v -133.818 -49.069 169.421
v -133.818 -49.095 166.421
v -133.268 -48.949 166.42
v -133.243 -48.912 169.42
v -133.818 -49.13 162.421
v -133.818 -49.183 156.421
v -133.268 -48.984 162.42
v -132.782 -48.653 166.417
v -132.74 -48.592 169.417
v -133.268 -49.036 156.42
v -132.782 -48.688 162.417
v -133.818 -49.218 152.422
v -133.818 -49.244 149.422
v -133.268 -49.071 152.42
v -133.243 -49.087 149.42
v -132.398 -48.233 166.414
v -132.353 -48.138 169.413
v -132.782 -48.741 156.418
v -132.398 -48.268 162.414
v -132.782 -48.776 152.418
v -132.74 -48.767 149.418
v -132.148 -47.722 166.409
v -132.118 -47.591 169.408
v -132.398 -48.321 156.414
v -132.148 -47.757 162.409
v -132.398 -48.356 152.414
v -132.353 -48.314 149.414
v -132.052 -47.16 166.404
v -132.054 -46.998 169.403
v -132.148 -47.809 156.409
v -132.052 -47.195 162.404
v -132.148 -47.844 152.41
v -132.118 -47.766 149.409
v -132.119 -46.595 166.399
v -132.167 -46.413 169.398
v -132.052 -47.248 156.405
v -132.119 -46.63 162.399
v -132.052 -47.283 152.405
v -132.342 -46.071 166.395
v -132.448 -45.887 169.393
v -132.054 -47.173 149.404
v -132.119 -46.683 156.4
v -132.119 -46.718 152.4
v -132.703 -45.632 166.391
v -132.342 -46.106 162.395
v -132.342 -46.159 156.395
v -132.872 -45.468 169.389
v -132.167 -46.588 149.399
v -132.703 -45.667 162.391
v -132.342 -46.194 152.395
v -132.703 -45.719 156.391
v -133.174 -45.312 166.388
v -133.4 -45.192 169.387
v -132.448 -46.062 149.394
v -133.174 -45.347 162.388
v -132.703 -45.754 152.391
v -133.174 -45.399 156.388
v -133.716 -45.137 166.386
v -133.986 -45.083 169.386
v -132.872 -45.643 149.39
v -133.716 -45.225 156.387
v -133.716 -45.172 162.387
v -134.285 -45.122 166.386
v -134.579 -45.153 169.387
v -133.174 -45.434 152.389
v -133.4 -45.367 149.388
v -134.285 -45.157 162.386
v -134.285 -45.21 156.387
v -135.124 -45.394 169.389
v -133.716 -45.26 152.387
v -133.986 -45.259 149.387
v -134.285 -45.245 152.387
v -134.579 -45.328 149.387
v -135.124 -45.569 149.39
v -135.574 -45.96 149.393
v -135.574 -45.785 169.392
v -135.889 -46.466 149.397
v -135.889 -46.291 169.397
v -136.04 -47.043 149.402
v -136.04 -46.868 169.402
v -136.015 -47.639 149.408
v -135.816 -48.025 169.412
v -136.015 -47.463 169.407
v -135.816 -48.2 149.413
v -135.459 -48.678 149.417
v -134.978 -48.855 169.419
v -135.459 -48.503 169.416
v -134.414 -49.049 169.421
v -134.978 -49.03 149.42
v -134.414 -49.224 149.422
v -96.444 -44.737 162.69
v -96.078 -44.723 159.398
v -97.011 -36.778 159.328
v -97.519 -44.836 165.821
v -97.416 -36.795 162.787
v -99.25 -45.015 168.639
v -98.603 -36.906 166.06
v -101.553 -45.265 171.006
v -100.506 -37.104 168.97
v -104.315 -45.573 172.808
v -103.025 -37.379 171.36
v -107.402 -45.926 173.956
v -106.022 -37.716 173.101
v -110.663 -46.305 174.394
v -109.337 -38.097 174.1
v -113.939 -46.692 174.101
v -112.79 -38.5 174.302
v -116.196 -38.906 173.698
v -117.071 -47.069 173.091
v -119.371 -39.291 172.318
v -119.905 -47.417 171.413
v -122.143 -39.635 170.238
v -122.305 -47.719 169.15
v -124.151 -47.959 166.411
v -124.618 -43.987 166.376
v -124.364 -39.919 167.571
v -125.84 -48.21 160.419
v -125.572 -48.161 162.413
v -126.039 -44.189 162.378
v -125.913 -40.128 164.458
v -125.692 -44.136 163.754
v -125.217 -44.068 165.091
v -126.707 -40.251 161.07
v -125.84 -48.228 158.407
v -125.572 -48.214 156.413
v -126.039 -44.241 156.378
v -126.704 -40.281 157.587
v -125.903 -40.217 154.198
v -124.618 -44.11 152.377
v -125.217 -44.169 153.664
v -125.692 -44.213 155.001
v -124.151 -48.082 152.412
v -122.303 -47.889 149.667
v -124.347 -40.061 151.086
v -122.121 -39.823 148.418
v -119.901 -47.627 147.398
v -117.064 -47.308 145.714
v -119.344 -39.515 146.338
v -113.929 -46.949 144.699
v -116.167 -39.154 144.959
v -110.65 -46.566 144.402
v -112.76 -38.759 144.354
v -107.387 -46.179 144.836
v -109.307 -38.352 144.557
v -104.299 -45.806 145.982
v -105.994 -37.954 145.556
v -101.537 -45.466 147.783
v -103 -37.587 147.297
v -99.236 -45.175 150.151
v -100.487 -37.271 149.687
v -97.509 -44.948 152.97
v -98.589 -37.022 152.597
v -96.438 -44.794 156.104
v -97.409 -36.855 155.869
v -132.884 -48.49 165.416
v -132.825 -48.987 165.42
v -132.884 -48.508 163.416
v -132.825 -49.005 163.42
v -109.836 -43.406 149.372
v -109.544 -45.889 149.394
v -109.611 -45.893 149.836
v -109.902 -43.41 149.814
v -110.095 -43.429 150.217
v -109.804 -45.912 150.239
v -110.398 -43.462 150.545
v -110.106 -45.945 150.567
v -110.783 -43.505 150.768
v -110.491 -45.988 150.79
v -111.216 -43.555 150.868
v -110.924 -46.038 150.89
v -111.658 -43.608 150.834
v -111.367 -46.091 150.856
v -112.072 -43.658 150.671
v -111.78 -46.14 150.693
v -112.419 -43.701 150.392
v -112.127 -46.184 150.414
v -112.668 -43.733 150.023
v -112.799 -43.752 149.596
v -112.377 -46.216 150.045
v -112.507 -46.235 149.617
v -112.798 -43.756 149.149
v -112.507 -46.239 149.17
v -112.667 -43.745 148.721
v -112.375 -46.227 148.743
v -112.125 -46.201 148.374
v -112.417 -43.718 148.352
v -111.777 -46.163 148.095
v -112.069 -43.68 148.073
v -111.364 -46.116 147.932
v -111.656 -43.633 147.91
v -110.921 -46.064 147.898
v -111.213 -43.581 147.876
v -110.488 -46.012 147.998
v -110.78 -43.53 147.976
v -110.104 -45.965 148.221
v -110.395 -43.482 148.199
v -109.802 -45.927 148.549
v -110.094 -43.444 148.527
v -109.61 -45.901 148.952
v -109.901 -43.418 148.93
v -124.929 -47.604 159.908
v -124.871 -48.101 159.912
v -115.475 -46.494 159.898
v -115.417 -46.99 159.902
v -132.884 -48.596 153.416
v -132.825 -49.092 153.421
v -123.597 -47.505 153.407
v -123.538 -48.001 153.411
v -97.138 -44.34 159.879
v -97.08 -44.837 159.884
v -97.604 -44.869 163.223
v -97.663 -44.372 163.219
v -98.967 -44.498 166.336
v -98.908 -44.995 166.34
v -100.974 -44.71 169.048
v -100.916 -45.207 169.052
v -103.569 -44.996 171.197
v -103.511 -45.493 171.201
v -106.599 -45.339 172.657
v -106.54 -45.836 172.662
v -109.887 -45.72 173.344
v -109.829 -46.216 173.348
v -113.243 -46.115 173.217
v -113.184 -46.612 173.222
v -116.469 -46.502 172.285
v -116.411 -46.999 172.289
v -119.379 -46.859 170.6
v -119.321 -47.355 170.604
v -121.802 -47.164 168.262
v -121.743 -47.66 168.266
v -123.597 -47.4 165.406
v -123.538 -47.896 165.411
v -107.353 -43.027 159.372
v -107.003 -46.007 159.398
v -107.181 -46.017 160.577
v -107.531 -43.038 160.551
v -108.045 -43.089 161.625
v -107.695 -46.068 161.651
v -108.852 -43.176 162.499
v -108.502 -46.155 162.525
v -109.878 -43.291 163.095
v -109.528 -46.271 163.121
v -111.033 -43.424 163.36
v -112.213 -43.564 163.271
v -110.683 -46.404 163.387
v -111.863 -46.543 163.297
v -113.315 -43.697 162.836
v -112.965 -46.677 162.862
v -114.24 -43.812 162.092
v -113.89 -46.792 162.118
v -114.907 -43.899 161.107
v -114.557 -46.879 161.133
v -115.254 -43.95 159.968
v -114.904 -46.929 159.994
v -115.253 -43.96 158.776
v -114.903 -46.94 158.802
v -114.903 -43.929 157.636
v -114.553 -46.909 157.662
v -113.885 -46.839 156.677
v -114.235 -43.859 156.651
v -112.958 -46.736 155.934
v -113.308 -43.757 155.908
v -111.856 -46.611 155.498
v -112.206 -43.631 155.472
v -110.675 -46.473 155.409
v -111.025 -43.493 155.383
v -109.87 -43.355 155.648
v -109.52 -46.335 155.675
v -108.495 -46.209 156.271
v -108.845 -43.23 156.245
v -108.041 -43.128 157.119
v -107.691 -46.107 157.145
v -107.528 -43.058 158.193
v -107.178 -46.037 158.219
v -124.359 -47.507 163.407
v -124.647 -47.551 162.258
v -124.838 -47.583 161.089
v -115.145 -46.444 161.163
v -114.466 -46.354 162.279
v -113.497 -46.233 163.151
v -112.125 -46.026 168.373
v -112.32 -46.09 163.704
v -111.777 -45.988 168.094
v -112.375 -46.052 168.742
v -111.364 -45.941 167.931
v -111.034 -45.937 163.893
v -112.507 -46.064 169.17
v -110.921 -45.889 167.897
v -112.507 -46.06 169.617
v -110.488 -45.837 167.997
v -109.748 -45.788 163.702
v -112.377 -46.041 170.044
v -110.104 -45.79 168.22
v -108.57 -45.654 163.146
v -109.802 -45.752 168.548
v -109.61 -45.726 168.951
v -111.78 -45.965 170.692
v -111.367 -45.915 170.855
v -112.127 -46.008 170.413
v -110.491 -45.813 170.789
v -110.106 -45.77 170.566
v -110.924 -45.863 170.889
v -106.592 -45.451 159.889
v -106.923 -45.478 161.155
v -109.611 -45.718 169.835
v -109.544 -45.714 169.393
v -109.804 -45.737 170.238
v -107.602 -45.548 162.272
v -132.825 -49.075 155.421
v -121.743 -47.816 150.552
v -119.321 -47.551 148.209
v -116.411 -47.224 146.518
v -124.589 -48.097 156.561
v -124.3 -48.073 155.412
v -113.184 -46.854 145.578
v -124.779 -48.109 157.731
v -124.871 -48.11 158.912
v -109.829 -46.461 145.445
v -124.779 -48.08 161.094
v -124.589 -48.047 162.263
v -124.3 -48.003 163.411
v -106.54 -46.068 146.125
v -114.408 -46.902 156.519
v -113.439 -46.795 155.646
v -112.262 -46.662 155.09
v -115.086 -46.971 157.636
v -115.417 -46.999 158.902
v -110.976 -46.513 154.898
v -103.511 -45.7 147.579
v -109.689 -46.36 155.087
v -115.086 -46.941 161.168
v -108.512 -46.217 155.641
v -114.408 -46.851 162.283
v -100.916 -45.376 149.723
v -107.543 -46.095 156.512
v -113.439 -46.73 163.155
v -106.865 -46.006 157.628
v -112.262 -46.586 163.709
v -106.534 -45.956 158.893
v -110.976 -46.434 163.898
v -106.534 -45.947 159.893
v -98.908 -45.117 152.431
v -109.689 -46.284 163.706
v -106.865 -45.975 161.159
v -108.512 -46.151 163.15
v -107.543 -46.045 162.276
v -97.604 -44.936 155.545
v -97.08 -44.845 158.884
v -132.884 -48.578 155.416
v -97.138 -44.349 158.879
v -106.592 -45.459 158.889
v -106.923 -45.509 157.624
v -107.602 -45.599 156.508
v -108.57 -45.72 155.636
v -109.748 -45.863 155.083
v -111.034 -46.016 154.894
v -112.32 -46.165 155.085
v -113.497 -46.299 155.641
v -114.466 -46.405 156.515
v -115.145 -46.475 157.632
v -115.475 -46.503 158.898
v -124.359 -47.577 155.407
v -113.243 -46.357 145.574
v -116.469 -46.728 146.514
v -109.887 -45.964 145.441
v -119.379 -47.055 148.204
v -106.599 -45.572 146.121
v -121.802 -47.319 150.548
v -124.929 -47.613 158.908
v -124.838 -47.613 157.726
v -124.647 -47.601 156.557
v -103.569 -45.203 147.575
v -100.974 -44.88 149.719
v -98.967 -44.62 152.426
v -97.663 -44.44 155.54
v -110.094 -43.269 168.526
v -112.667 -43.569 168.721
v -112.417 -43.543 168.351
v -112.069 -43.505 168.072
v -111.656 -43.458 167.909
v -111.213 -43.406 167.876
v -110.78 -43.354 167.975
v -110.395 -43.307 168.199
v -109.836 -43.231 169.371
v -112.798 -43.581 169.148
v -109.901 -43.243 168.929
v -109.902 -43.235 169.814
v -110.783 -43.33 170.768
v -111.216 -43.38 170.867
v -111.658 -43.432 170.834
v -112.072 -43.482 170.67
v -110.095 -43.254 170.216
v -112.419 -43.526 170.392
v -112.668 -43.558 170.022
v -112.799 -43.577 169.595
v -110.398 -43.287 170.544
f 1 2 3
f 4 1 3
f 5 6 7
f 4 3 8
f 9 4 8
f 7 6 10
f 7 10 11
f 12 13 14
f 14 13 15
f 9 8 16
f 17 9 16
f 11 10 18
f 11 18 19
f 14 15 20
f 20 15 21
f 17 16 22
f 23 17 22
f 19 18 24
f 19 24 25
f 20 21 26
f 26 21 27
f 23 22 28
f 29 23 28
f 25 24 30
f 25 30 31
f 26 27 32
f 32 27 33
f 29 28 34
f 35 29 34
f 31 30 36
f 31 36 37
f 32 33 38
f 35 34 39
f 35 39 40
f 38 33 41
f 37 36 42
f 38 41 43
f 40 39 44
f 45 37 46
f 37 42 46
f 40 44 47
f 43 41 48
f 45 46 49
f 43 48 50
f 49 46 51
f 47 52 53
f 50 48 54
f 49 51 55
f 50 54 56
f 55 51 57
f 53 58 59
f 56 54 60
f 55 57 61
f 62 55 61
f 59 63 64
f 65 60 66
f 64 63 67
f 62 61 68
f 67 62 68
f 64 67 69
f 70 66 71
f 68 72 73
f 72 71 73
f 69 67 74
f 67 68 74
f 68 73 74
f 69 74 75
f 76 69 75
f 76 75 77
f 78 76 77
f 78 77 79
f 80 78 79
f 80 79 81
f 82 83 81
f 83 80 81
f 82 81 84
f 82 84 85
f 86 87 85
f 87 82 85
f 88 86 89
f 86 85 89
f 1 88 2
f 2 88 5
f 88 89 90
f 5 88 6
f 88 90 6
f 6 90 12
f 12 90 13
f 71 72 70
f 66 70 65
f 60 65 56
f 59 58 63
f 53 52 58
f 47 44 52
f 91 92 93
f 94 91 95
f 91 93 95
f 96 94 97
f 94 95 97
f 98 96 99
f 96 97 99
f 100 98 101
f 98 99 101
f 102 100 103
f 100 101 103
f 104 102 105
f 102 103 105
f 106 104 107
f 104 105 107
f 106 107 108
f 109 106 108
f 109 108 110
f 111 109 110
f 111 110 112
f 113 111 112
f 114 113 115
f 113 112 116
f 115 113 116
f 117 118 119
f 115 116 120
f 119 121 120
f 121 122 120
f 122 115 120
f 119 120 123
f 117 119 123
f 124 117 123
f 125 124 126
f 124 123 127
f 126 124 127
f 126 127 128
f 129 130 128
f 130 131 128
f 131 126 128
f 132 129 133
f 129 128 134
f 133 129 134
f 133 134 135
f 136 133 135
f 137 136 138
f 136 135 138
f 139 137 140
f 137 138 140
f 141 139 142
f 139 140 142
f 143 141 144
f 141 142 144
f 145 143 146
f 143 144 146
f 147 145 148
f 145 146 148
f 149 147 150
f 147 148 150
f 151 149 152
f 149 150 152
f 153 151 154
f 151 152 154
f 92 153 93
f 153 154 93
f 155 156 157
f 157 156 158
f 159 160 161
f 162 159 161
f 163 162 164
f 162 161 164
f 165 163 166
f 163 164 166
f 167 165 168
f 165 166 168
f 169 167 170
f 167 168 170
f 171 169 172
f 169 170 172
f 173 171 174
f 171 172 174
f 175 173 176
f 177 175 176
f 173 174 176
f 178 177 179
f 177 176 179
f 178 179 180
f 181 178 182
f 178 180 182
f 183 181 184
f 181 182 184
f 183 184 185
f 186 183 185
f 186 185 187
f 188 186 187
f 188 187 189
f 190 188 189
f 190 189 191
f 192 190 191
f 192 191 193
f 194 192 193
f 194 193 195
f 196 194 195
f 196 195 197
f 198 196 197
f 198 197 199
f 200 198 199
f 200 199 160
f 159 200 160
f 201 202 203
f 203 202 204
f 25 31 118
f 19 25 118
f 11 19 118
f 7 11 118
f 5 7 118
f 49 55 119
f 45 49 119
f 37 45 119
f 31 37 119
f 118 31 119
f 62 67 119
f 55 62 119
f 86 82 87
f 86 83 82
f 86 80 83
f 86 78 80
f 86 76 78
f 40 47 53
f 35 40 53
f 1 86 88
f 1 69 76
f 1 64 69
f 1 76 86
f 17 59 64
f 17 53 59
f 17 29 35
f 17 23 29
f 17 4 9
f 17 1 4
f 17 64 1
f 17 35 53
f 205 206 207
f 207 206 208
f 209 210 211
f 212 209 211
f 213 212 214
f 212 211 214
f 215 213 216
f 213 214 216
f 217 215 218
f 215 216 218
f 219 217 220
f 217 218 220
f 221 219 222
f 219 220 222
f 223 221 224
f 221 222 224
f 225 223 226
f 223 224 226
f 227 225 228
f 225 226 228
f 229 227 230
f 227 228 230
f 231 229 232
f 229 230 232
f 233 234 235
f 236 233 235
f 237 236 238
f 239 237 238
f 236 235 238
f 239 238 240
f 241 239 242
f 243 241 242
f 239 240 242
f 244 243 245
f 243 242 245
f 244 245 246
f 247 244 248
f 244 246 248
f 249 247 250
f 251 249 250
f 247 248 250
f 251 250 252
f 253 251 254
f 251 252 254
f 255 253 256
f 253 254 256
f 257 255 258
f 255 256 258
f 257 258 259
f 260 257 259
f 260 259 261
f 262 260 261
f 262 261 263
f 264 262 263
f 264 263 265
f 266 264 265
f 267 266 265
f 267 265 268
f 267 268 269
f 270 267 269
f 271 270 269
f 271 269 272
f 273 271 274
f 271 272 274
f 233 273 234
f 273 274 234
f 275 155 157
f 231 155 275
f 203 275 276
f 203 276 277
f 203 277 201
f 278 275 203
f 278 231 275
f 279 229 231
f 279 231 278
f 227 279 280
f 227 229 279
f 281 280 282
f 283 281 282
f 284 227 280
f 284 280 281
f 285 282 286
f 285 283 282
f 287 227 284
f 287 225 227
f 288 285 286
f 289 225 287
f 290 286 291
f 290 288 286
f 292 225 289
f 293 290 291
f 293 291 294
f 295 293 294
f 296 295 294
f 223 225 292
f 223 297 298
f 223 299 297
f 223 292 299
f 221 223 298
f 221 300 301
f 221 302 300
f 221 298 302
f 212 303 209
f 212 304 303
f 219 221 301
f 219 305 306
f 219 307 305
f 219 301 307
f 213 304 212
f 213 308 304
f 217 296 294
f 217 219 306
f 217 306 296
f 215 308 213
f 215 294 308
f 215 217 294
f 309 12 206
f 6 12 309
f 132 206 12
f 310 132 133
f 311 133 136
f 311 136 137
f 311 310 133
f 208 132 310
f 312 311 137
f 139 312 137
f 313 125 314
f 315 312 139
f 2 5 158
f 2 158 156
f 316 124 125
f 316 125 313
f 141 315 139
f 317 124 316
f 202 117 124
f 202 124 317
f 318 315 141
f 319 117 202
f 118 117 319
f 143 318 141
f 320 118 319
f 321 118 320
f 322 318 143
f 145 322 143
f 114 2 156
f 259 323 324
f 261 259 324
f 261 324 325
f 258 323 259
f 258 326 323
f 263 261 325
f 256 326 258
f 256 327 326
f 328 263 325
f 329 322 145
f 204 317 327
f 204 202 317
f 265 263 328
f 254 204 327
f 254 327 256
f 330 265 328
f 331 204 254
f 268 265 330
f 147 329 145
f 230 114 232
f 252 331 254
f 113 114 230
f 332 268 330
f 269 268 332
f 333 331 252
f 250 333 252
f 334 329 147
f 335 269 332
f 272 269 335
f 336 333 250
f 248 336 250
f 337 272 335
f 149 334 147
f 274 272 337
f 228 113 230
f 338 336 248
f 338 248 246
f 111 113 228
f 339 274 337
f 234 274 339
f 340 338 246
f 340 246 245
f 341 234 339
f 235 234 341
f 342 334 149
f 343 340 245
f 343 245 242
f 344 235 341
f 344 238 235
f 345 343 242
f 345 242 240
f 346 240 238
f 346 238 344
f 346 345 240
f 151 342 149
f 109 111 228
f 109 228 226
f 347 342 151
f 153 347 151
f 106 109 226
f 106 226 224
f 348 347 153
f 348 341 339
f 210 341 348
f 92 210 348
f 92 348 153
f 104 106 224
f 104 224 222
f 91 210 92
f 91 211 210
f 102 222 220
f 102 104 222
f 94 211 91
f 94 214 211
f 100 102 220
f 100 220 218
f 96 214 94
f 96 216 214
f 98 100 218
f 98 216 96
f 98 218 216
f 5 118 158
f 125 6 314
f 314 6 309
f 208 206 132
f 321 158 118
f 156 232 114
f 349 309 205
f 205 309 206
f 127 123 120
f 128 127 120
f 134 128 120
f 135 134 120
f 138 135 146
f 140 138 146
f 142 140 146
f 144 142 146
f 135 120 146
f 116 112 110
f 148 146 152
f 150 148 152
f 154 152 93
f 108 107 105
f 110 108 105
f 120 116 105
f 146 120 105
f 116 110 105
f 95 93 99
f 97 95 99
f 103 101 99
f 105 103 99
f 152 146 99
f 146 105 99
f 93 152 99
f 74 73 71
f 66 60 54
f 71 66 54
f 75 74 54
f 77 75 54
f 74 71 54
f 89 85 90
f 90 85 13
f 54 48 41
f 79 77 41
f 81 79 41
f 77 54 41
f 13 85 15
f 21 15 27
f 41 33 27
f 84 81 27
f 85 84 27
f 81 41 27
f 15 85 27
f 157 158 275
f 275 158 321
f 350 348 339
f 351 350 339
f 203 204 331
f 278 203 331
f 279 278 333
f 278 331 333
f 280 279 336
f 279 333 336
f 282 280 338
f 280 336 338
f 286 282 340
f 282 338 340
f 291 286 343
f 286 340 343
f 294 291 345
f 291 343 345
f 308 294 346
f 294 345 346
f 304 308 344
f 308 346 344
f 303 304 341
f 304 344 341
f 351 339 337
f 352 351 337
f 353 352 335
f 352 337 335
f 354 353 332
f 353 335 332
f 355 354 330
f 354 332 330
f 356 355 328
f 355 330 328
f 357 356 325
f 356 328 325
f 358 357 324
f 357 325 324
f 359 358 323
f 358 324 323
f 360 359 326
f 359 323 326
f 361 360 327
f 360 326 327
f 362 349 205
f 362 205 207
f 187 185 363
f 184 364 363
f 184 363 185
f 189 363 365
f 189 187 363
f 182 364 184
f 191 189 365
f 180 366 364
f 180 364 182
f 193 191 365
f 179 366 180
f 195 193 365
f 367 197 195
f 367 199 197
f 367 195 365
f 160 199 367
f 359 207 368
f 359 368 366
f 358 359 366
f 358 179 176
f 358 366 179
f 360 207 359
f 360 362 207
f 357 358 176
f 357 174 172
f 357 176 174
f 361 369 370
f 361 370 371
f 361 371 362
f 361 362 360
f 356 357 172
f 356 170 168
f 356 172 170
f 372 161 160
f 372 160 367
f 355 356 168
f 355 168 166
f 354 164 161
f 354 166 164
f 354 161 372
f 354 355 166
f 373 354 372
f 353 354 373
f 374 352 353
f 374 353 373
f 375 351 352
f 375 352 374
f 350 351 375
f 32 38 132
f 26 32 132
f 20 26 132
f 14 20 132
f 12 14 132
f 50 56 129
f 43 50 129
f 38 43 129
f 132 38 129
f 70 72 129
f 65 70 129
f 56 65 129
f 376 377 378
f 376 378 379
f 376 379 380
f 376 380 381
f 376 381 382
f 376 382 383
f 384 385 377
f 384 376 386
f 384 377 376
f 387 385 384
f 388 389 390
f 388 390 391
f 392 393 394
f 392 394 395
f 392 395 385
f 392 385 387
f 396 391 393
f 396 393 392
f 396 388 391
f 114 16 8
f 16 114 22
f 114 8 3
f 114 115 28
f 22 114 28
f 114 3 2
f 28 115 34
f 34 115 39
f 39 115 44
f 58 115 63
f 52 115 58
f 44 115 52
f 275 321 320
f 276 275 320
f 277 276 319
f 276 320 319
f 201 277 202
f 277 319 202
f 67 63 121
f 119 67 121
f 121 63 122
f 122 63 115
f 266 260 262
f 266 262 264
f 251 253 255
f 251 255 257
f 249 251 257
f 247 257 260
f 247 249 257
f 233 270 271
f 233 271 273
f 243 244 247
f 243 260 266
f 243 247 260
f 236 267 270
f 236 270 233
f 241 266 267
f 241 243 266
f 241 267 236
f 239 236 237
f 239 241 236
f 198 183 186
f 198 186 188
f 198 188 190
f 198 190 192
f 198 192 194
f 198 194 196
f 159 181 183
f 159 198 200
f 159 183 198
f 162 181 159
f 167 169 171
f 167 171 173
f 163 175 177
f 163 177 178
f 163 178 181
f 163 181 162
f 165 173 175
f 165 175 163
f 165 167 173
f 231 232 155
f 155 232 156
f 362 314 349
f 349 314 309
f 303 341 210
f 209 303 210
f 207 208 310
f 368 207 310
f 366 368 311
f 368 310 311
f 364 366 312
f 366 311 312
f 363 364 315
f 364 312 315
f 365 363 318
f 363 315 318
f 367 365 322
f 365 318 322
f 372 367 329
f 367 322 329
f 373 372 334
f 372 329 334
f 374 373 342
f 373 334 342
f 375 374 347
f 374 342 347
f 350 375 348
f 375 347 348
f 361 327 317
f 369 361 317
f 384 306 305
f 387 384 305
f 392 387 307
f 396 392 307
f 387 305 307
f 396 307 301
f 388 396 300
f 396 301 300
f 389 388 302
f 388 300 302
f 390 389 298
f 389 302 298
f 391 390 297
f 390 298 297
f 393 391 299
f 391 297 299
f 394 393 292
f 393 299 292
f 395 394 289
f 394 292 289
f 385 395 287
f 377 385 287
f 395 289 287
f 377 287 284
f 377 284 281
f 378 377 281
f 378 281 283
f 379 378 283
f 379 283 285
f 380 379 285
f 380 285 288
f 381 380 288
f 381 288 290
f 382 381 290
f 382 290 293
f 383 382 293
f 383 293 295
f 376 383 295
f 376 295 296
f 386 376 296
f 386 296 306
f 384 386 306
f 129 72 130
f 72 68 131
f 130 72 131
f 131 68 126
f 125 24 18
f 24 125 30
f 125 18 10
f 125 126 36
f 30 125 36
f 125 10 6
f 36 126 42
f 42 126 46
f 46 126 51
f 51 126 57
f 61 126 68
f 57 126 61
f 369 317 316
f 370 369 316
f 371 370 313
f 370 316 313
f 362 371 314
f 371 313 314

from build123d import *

# Parameters (mm, degrees)
CROQUIS1_R                   = 15.000000000000002
SALIENTE_EXTRUIR1_DEPTH      = 8
CROQUIS2_R                   = 4.000000000000007
CROQUIS2_R_2                 = 1.4999999999999973
CORTAR_EXTRUIR1_DEPTH        = 3
SALIENTE_EXTRUIR2_START      = -4
SALIENTE_EXTRUIR2_DEPTH      = 4
SALIENTE_EXTRUIR3_DEPTH      = 10
SALIENTE_EXTRUIR3_DEPTH_BACK = 10
CROQUIS4_R                   = 1.999999999999995
CORTAR_EXTRUIR2_DEPTH        = 26.000000000000004
CROQUIS6_R                   = 1.499999999999999
CORTAR_EXTRUIR3_DEPTH        = 0.5


with BuildPart() as part:
    # Croquis1 → Saliente-Extruir1 (new body)
    with BuildSketch(Plane(origin=(3.102503887066035, -26.412068884743757, 0.2313913751144545), x_dir=(0.9931720445250996, 0.11665438489091776, -0.0010219880408017562), z_dir=(0.11665886153153528, -0.9931339327669669, 0.008700667387268338))):
        with Locations(Location((-115.80198834358447, 158.9846336736222, 0), (0, 0, 0.058557828))):
            Circle(CROQUIS1_R)
    extrude(amount=SALIENTE_EXTRUIR1_DEPTH)

    # Croquis2 → Cortar-Extruir1 (cut)
    with BuildSketch(Plane(origin=(4.03577477931832, -34.35714034687951, 0.3009967142126015), x_dir=(0.9931720445250996, 0.11665438489091778, -0.0010219880408017569), z_dir=(0.1166588615315353, -0.9931339327669669, 0.00870066738726834))):
        with Locations(Location((-115.8019883435845, 158.9846336736222, 0), (0, 0, 0.058557828))):
            Circle(CROQUIS2_R)
        with Locations(Location((-115.8019883435845, 168.9846336736222, 0), (0, 0, 0.058557828))):
            Circle(CROQUIS2_R_2)
        with Locations(Location((-115.8019883435845, 148.9846336736222, 0), (0, 0, 0.058557828))):
            Circle(CROQUIS2_R_2)
    extrude(amount=-CORTAR_EXTRUIR1_DEPTH, mode=Mode.SUBTRACT)

    # Croquis3 → Saliente-Extruir2 (add)
    with BuildSketch(Plane(origin=(4.03577477931832, -34.35714034687951, 0.3009967142126015), x_dir=(0.9931720445250996, 0.11665438489091778, -0.0010219880408017569), z_dir=(0.1166588615315353, -0.9931339327669669, 0.00870066738726834)).offset(SALIENTE_EXTRUIR2_START)):
        with BuildLine():
            Line((-140.80198834358453, 161.9846336736222), (-130.49892680028356, 161.9846336736222))
            ThreePointArc((-130.49892680028356, 161.98463367362223), (-129.9260267482204, 164.03552855912218), (-129.06848750500595, 165.98463367362243))
            Line((-129.0684875050059, 165.9846336736222), (-140.80198834358453, 165.9846336736222))
            Line((-140.80198834358453, 165.9846336736222), (-140.80198834358453, 161.9846336736222))
        make_face()
        with BuildLine():
            ThreePointArc((-129.06848750500598, 151.98463367362197), (-129.9260267482204, 153.9337387881222), (-130.49892680028356, 155.98463367362217))
            Line((-130.49892680028356, 155.9846336736222), (-140.80198834358453, 155.9846336736222))
            Line((-140.80198834358453, 155.9846336736222), (-140.80198834358453, 151.9846336736222))
            Line((-140.80198834358453, 151.9846336736222), (-129.06848750500592, 151.9846336736222))
        make_face()
        with BuildLine():
            Line((-125.01691169330087, 151.9846336736222), (-125.01691169330087, 155.9846336736222))
            Line((-125.01691169330087, 155.9846336736222), (-130.49892680028356, 155.9846336736222))
            ThreePointArc((-130.49892680028356, 155.98463367362217), (-129.9260267482204, 153.9337387881222), (-129.06848750500598, 151.98463367362197))
            Line((-129.06848750500592, 151.9846336736222), (-125.01691169330087, 151.9846336736222))
        make_face()
        with BuildLine():
            Line((-130.49892680028356, 161.9846336736222), (-125.01691169330087, 161.9846336736222))
            Line((-125.01691169330087, 161.9846336736222), (-125.01691169330087, 165.9846336736222))
            Line((-125.01691169330087, 165.9846336736222), (-129.0684875050059, 165.9846336736222))
            ThreePointArc((-129.06848750500595, 165.98463367362243), (-129.9260267482204, 164.03552855912218), (-130.49892680028356, 161.98463367362223))
        make_face()
    extrude(amount=SALIENTE_EXTRUIR2_DEPTH)

    # Croquis4 → Saliente-Extruir3 (add, two sides: drawn at the far end of the back side and taken through both)
    with BuildSketch(Plane(origin=(-6.683e-14, 1.3927822726245929, 158.97853283345188), x_dir=(1, 0, 4.2e-16), z_dir=(0, 0.008760483579084877, 0.9999616262274571)).offset(-SALIENTE_EXTRUIR3_DEPTH_BACK)):
        with Locations(Location((-134.05179749109138, -48.5645966599886, 0), (0, 0, 276.699314902))):
            Circle(CROQUIS4_R)
    extrude(amount=SALIENTE_EXTRUIR3_DEPTH + SALIENTE_EXTRUIR3_DEPTH_BACK)

    # Croquis5 → Cortar-Extruir2 (cut)
    with BuildSketch(Plane(origin=(-7.073e-14, 1.4803871084154419, 168.97814909572648), x_dir=(1, 0, 4.2e-16), z_dir=(0, 0.008760483579084877, 0.9999616262274571))):
        Polygon((-137.1921048729679, -53.52505022011607), (-133.51980518703422, -53.09369867037679), (-133.8184797680283, -50.5509407490388), (-135.80482385707867, -50.78425847210188), (-136.03814158014168, -48.79791438305168), (-136.2714593032048, -46.81157029400149), (-134.28511521415442, -46.578252570938396), (-134.47954467160224, -44.922982673441965), (-138.15184435753594, -45.35433422318124), align=None)
        with BuildLine():
            ThreePointArc((-136.03814158014154, -48.79791438305167), (-135.62133541037747, -47.32501982900029), (-134.28511521415442, -46.57825257093841))
            Line((-134.28511521415442, -46.578252570938396), (-136.2714593032048, -46.81157029400149))
            Line((-136.2714593032048, -46.81157029400149), (-136.03814158014168, -48.79791438305168))
        make_face()
        with BuildLine():
            ThreePointArc((-133.8184797680283, -50.550940749038816), (-135.2913743220797, -50.13413457927471), (-136.03814158014154, -48.79791438305167))
            Line((-136.03814158014168, -48.79791438305168), (-135.80482385707867, -50.78425847210188))
            Line((-135.80482385707867, -50.78425847210188), (-133.8184797680283, -50.5509407490388))
        make_face()
    extrude(amount=-CORTAR_EXTRUIR2_DEPTH, mode=Mode.SUBTRACT)

    # Croquis6 → Cortar-Extruir3 (cut)
    # profile 1 of 2: a face of its own
    with BuildSketch(Plane(origin=(4.03577477931832, -34.35714034687951, 0.3009967142126015), x_dir=(0.9931720445250996, 0.11665438489091778, -0.0010219880408017569), z_dir=(0.1166588615315353, -0.9931339327669669, 0.008700667387268341))):
        with BuildLine():
            Line((-111.32985238858495, 159.4846336736222), (-101.81091976395129, 159.4846336736222))
            ThreePointArc((-101.81091976395126, 159.48463367362265), (-112.97131478814173, 172.6954792792921), (-128.45109898425804, 164.9846336736222))
            Line((-128.45109898425804, 164.9846336736222), (-137.80198834358436, 164.98463367362217))
            Line((-137.80198834358436, 164.98463367362217), (-137.80198834358436, 162.98463367362217))
            Line((-137.80198834358436, 162.98463367362217), (-129.21839620858324, 162.9846336736222))
            ThreePointArc((-129.21839620858324, 162.9846336736222), (-129.6170142670406, 161.25290586501285), (-129.7930569232177, 159.48463367362226))
            Line((-129.7930569232177, 159.4846336736222), (-120.27412429858411, 159.4846336736222))
            ThreePointArc((-120.27412429858411, 159.48463367362217), (-115.80198834358455, 163.4846336736222), (-111.32985238858495, 159.48463367362223))
        make_face()
        with Locations(Location((-115.80198834358454, 168.9846336736222, 0), (0, 0, 0.058557828))):
            Circle(CROQUIS6_R, mode=Mode.SUBTRACT)
    # profile 2 of 2: a face of its own
    with BuildSketch(Plane(origin=(4.03577477931832, -34.35714034687951, 0.3009967142126015), x_dir=(0.9931720445250996, 0.11665438489091778, -0.0010219880408017569), z_dir=(0.1166588615315353, -0.9931339327669669, 0.008700667387268341))):
        with BuildLine():
            ThreePointArc((-128.45109898425804, 152.9846336736222), (-112.97131478814173, 145.2737880679523), (-101.81091976395126, 158.48463367362174))
            Line((-101.81091976395128, 158.4846336736222), (-111.32985238858495, 158.4846336736222))
            ThreePointArc((-111.32985238858495, 158.48463367362217), (-115.80198834358455, 154.4846336736222), (-120.27412429858411, 158.48463367362223))
            Line((-120.27412429858411, 158.4846336736222), (-129.7930569232177, 158.4846336736222))
            ThreePointArc((-129.7930569232177, 158.48463367362214), (-129.6170142670406, 156.71636148223155), (-129.21839620858327, 154.98463367362223))
            Line((-129.21839620858327, 154.98463367362223), (-137.80198834358436, 154.9846336736222))
            Line((-137.80198834358436, 154.9846336736222), (-137.80198834358436, 152.9846336736222))
            Line((-137.80198834358436, 152.9846336736222), (-128.45109898425804, 152.9846336736222))
        make_face()
        with Locations(Location((-115.80198834358453, 148.9846336736222, 0), (0, 0, 0.058557828))):
            Circle(CROQUIS6_R, mode=Mode.SUBTRACT)
    extrude(amount=-CORTAR_EXTRUIR3_DEPTH, mode=Mode.SUBTRACT)


solid = part.part
